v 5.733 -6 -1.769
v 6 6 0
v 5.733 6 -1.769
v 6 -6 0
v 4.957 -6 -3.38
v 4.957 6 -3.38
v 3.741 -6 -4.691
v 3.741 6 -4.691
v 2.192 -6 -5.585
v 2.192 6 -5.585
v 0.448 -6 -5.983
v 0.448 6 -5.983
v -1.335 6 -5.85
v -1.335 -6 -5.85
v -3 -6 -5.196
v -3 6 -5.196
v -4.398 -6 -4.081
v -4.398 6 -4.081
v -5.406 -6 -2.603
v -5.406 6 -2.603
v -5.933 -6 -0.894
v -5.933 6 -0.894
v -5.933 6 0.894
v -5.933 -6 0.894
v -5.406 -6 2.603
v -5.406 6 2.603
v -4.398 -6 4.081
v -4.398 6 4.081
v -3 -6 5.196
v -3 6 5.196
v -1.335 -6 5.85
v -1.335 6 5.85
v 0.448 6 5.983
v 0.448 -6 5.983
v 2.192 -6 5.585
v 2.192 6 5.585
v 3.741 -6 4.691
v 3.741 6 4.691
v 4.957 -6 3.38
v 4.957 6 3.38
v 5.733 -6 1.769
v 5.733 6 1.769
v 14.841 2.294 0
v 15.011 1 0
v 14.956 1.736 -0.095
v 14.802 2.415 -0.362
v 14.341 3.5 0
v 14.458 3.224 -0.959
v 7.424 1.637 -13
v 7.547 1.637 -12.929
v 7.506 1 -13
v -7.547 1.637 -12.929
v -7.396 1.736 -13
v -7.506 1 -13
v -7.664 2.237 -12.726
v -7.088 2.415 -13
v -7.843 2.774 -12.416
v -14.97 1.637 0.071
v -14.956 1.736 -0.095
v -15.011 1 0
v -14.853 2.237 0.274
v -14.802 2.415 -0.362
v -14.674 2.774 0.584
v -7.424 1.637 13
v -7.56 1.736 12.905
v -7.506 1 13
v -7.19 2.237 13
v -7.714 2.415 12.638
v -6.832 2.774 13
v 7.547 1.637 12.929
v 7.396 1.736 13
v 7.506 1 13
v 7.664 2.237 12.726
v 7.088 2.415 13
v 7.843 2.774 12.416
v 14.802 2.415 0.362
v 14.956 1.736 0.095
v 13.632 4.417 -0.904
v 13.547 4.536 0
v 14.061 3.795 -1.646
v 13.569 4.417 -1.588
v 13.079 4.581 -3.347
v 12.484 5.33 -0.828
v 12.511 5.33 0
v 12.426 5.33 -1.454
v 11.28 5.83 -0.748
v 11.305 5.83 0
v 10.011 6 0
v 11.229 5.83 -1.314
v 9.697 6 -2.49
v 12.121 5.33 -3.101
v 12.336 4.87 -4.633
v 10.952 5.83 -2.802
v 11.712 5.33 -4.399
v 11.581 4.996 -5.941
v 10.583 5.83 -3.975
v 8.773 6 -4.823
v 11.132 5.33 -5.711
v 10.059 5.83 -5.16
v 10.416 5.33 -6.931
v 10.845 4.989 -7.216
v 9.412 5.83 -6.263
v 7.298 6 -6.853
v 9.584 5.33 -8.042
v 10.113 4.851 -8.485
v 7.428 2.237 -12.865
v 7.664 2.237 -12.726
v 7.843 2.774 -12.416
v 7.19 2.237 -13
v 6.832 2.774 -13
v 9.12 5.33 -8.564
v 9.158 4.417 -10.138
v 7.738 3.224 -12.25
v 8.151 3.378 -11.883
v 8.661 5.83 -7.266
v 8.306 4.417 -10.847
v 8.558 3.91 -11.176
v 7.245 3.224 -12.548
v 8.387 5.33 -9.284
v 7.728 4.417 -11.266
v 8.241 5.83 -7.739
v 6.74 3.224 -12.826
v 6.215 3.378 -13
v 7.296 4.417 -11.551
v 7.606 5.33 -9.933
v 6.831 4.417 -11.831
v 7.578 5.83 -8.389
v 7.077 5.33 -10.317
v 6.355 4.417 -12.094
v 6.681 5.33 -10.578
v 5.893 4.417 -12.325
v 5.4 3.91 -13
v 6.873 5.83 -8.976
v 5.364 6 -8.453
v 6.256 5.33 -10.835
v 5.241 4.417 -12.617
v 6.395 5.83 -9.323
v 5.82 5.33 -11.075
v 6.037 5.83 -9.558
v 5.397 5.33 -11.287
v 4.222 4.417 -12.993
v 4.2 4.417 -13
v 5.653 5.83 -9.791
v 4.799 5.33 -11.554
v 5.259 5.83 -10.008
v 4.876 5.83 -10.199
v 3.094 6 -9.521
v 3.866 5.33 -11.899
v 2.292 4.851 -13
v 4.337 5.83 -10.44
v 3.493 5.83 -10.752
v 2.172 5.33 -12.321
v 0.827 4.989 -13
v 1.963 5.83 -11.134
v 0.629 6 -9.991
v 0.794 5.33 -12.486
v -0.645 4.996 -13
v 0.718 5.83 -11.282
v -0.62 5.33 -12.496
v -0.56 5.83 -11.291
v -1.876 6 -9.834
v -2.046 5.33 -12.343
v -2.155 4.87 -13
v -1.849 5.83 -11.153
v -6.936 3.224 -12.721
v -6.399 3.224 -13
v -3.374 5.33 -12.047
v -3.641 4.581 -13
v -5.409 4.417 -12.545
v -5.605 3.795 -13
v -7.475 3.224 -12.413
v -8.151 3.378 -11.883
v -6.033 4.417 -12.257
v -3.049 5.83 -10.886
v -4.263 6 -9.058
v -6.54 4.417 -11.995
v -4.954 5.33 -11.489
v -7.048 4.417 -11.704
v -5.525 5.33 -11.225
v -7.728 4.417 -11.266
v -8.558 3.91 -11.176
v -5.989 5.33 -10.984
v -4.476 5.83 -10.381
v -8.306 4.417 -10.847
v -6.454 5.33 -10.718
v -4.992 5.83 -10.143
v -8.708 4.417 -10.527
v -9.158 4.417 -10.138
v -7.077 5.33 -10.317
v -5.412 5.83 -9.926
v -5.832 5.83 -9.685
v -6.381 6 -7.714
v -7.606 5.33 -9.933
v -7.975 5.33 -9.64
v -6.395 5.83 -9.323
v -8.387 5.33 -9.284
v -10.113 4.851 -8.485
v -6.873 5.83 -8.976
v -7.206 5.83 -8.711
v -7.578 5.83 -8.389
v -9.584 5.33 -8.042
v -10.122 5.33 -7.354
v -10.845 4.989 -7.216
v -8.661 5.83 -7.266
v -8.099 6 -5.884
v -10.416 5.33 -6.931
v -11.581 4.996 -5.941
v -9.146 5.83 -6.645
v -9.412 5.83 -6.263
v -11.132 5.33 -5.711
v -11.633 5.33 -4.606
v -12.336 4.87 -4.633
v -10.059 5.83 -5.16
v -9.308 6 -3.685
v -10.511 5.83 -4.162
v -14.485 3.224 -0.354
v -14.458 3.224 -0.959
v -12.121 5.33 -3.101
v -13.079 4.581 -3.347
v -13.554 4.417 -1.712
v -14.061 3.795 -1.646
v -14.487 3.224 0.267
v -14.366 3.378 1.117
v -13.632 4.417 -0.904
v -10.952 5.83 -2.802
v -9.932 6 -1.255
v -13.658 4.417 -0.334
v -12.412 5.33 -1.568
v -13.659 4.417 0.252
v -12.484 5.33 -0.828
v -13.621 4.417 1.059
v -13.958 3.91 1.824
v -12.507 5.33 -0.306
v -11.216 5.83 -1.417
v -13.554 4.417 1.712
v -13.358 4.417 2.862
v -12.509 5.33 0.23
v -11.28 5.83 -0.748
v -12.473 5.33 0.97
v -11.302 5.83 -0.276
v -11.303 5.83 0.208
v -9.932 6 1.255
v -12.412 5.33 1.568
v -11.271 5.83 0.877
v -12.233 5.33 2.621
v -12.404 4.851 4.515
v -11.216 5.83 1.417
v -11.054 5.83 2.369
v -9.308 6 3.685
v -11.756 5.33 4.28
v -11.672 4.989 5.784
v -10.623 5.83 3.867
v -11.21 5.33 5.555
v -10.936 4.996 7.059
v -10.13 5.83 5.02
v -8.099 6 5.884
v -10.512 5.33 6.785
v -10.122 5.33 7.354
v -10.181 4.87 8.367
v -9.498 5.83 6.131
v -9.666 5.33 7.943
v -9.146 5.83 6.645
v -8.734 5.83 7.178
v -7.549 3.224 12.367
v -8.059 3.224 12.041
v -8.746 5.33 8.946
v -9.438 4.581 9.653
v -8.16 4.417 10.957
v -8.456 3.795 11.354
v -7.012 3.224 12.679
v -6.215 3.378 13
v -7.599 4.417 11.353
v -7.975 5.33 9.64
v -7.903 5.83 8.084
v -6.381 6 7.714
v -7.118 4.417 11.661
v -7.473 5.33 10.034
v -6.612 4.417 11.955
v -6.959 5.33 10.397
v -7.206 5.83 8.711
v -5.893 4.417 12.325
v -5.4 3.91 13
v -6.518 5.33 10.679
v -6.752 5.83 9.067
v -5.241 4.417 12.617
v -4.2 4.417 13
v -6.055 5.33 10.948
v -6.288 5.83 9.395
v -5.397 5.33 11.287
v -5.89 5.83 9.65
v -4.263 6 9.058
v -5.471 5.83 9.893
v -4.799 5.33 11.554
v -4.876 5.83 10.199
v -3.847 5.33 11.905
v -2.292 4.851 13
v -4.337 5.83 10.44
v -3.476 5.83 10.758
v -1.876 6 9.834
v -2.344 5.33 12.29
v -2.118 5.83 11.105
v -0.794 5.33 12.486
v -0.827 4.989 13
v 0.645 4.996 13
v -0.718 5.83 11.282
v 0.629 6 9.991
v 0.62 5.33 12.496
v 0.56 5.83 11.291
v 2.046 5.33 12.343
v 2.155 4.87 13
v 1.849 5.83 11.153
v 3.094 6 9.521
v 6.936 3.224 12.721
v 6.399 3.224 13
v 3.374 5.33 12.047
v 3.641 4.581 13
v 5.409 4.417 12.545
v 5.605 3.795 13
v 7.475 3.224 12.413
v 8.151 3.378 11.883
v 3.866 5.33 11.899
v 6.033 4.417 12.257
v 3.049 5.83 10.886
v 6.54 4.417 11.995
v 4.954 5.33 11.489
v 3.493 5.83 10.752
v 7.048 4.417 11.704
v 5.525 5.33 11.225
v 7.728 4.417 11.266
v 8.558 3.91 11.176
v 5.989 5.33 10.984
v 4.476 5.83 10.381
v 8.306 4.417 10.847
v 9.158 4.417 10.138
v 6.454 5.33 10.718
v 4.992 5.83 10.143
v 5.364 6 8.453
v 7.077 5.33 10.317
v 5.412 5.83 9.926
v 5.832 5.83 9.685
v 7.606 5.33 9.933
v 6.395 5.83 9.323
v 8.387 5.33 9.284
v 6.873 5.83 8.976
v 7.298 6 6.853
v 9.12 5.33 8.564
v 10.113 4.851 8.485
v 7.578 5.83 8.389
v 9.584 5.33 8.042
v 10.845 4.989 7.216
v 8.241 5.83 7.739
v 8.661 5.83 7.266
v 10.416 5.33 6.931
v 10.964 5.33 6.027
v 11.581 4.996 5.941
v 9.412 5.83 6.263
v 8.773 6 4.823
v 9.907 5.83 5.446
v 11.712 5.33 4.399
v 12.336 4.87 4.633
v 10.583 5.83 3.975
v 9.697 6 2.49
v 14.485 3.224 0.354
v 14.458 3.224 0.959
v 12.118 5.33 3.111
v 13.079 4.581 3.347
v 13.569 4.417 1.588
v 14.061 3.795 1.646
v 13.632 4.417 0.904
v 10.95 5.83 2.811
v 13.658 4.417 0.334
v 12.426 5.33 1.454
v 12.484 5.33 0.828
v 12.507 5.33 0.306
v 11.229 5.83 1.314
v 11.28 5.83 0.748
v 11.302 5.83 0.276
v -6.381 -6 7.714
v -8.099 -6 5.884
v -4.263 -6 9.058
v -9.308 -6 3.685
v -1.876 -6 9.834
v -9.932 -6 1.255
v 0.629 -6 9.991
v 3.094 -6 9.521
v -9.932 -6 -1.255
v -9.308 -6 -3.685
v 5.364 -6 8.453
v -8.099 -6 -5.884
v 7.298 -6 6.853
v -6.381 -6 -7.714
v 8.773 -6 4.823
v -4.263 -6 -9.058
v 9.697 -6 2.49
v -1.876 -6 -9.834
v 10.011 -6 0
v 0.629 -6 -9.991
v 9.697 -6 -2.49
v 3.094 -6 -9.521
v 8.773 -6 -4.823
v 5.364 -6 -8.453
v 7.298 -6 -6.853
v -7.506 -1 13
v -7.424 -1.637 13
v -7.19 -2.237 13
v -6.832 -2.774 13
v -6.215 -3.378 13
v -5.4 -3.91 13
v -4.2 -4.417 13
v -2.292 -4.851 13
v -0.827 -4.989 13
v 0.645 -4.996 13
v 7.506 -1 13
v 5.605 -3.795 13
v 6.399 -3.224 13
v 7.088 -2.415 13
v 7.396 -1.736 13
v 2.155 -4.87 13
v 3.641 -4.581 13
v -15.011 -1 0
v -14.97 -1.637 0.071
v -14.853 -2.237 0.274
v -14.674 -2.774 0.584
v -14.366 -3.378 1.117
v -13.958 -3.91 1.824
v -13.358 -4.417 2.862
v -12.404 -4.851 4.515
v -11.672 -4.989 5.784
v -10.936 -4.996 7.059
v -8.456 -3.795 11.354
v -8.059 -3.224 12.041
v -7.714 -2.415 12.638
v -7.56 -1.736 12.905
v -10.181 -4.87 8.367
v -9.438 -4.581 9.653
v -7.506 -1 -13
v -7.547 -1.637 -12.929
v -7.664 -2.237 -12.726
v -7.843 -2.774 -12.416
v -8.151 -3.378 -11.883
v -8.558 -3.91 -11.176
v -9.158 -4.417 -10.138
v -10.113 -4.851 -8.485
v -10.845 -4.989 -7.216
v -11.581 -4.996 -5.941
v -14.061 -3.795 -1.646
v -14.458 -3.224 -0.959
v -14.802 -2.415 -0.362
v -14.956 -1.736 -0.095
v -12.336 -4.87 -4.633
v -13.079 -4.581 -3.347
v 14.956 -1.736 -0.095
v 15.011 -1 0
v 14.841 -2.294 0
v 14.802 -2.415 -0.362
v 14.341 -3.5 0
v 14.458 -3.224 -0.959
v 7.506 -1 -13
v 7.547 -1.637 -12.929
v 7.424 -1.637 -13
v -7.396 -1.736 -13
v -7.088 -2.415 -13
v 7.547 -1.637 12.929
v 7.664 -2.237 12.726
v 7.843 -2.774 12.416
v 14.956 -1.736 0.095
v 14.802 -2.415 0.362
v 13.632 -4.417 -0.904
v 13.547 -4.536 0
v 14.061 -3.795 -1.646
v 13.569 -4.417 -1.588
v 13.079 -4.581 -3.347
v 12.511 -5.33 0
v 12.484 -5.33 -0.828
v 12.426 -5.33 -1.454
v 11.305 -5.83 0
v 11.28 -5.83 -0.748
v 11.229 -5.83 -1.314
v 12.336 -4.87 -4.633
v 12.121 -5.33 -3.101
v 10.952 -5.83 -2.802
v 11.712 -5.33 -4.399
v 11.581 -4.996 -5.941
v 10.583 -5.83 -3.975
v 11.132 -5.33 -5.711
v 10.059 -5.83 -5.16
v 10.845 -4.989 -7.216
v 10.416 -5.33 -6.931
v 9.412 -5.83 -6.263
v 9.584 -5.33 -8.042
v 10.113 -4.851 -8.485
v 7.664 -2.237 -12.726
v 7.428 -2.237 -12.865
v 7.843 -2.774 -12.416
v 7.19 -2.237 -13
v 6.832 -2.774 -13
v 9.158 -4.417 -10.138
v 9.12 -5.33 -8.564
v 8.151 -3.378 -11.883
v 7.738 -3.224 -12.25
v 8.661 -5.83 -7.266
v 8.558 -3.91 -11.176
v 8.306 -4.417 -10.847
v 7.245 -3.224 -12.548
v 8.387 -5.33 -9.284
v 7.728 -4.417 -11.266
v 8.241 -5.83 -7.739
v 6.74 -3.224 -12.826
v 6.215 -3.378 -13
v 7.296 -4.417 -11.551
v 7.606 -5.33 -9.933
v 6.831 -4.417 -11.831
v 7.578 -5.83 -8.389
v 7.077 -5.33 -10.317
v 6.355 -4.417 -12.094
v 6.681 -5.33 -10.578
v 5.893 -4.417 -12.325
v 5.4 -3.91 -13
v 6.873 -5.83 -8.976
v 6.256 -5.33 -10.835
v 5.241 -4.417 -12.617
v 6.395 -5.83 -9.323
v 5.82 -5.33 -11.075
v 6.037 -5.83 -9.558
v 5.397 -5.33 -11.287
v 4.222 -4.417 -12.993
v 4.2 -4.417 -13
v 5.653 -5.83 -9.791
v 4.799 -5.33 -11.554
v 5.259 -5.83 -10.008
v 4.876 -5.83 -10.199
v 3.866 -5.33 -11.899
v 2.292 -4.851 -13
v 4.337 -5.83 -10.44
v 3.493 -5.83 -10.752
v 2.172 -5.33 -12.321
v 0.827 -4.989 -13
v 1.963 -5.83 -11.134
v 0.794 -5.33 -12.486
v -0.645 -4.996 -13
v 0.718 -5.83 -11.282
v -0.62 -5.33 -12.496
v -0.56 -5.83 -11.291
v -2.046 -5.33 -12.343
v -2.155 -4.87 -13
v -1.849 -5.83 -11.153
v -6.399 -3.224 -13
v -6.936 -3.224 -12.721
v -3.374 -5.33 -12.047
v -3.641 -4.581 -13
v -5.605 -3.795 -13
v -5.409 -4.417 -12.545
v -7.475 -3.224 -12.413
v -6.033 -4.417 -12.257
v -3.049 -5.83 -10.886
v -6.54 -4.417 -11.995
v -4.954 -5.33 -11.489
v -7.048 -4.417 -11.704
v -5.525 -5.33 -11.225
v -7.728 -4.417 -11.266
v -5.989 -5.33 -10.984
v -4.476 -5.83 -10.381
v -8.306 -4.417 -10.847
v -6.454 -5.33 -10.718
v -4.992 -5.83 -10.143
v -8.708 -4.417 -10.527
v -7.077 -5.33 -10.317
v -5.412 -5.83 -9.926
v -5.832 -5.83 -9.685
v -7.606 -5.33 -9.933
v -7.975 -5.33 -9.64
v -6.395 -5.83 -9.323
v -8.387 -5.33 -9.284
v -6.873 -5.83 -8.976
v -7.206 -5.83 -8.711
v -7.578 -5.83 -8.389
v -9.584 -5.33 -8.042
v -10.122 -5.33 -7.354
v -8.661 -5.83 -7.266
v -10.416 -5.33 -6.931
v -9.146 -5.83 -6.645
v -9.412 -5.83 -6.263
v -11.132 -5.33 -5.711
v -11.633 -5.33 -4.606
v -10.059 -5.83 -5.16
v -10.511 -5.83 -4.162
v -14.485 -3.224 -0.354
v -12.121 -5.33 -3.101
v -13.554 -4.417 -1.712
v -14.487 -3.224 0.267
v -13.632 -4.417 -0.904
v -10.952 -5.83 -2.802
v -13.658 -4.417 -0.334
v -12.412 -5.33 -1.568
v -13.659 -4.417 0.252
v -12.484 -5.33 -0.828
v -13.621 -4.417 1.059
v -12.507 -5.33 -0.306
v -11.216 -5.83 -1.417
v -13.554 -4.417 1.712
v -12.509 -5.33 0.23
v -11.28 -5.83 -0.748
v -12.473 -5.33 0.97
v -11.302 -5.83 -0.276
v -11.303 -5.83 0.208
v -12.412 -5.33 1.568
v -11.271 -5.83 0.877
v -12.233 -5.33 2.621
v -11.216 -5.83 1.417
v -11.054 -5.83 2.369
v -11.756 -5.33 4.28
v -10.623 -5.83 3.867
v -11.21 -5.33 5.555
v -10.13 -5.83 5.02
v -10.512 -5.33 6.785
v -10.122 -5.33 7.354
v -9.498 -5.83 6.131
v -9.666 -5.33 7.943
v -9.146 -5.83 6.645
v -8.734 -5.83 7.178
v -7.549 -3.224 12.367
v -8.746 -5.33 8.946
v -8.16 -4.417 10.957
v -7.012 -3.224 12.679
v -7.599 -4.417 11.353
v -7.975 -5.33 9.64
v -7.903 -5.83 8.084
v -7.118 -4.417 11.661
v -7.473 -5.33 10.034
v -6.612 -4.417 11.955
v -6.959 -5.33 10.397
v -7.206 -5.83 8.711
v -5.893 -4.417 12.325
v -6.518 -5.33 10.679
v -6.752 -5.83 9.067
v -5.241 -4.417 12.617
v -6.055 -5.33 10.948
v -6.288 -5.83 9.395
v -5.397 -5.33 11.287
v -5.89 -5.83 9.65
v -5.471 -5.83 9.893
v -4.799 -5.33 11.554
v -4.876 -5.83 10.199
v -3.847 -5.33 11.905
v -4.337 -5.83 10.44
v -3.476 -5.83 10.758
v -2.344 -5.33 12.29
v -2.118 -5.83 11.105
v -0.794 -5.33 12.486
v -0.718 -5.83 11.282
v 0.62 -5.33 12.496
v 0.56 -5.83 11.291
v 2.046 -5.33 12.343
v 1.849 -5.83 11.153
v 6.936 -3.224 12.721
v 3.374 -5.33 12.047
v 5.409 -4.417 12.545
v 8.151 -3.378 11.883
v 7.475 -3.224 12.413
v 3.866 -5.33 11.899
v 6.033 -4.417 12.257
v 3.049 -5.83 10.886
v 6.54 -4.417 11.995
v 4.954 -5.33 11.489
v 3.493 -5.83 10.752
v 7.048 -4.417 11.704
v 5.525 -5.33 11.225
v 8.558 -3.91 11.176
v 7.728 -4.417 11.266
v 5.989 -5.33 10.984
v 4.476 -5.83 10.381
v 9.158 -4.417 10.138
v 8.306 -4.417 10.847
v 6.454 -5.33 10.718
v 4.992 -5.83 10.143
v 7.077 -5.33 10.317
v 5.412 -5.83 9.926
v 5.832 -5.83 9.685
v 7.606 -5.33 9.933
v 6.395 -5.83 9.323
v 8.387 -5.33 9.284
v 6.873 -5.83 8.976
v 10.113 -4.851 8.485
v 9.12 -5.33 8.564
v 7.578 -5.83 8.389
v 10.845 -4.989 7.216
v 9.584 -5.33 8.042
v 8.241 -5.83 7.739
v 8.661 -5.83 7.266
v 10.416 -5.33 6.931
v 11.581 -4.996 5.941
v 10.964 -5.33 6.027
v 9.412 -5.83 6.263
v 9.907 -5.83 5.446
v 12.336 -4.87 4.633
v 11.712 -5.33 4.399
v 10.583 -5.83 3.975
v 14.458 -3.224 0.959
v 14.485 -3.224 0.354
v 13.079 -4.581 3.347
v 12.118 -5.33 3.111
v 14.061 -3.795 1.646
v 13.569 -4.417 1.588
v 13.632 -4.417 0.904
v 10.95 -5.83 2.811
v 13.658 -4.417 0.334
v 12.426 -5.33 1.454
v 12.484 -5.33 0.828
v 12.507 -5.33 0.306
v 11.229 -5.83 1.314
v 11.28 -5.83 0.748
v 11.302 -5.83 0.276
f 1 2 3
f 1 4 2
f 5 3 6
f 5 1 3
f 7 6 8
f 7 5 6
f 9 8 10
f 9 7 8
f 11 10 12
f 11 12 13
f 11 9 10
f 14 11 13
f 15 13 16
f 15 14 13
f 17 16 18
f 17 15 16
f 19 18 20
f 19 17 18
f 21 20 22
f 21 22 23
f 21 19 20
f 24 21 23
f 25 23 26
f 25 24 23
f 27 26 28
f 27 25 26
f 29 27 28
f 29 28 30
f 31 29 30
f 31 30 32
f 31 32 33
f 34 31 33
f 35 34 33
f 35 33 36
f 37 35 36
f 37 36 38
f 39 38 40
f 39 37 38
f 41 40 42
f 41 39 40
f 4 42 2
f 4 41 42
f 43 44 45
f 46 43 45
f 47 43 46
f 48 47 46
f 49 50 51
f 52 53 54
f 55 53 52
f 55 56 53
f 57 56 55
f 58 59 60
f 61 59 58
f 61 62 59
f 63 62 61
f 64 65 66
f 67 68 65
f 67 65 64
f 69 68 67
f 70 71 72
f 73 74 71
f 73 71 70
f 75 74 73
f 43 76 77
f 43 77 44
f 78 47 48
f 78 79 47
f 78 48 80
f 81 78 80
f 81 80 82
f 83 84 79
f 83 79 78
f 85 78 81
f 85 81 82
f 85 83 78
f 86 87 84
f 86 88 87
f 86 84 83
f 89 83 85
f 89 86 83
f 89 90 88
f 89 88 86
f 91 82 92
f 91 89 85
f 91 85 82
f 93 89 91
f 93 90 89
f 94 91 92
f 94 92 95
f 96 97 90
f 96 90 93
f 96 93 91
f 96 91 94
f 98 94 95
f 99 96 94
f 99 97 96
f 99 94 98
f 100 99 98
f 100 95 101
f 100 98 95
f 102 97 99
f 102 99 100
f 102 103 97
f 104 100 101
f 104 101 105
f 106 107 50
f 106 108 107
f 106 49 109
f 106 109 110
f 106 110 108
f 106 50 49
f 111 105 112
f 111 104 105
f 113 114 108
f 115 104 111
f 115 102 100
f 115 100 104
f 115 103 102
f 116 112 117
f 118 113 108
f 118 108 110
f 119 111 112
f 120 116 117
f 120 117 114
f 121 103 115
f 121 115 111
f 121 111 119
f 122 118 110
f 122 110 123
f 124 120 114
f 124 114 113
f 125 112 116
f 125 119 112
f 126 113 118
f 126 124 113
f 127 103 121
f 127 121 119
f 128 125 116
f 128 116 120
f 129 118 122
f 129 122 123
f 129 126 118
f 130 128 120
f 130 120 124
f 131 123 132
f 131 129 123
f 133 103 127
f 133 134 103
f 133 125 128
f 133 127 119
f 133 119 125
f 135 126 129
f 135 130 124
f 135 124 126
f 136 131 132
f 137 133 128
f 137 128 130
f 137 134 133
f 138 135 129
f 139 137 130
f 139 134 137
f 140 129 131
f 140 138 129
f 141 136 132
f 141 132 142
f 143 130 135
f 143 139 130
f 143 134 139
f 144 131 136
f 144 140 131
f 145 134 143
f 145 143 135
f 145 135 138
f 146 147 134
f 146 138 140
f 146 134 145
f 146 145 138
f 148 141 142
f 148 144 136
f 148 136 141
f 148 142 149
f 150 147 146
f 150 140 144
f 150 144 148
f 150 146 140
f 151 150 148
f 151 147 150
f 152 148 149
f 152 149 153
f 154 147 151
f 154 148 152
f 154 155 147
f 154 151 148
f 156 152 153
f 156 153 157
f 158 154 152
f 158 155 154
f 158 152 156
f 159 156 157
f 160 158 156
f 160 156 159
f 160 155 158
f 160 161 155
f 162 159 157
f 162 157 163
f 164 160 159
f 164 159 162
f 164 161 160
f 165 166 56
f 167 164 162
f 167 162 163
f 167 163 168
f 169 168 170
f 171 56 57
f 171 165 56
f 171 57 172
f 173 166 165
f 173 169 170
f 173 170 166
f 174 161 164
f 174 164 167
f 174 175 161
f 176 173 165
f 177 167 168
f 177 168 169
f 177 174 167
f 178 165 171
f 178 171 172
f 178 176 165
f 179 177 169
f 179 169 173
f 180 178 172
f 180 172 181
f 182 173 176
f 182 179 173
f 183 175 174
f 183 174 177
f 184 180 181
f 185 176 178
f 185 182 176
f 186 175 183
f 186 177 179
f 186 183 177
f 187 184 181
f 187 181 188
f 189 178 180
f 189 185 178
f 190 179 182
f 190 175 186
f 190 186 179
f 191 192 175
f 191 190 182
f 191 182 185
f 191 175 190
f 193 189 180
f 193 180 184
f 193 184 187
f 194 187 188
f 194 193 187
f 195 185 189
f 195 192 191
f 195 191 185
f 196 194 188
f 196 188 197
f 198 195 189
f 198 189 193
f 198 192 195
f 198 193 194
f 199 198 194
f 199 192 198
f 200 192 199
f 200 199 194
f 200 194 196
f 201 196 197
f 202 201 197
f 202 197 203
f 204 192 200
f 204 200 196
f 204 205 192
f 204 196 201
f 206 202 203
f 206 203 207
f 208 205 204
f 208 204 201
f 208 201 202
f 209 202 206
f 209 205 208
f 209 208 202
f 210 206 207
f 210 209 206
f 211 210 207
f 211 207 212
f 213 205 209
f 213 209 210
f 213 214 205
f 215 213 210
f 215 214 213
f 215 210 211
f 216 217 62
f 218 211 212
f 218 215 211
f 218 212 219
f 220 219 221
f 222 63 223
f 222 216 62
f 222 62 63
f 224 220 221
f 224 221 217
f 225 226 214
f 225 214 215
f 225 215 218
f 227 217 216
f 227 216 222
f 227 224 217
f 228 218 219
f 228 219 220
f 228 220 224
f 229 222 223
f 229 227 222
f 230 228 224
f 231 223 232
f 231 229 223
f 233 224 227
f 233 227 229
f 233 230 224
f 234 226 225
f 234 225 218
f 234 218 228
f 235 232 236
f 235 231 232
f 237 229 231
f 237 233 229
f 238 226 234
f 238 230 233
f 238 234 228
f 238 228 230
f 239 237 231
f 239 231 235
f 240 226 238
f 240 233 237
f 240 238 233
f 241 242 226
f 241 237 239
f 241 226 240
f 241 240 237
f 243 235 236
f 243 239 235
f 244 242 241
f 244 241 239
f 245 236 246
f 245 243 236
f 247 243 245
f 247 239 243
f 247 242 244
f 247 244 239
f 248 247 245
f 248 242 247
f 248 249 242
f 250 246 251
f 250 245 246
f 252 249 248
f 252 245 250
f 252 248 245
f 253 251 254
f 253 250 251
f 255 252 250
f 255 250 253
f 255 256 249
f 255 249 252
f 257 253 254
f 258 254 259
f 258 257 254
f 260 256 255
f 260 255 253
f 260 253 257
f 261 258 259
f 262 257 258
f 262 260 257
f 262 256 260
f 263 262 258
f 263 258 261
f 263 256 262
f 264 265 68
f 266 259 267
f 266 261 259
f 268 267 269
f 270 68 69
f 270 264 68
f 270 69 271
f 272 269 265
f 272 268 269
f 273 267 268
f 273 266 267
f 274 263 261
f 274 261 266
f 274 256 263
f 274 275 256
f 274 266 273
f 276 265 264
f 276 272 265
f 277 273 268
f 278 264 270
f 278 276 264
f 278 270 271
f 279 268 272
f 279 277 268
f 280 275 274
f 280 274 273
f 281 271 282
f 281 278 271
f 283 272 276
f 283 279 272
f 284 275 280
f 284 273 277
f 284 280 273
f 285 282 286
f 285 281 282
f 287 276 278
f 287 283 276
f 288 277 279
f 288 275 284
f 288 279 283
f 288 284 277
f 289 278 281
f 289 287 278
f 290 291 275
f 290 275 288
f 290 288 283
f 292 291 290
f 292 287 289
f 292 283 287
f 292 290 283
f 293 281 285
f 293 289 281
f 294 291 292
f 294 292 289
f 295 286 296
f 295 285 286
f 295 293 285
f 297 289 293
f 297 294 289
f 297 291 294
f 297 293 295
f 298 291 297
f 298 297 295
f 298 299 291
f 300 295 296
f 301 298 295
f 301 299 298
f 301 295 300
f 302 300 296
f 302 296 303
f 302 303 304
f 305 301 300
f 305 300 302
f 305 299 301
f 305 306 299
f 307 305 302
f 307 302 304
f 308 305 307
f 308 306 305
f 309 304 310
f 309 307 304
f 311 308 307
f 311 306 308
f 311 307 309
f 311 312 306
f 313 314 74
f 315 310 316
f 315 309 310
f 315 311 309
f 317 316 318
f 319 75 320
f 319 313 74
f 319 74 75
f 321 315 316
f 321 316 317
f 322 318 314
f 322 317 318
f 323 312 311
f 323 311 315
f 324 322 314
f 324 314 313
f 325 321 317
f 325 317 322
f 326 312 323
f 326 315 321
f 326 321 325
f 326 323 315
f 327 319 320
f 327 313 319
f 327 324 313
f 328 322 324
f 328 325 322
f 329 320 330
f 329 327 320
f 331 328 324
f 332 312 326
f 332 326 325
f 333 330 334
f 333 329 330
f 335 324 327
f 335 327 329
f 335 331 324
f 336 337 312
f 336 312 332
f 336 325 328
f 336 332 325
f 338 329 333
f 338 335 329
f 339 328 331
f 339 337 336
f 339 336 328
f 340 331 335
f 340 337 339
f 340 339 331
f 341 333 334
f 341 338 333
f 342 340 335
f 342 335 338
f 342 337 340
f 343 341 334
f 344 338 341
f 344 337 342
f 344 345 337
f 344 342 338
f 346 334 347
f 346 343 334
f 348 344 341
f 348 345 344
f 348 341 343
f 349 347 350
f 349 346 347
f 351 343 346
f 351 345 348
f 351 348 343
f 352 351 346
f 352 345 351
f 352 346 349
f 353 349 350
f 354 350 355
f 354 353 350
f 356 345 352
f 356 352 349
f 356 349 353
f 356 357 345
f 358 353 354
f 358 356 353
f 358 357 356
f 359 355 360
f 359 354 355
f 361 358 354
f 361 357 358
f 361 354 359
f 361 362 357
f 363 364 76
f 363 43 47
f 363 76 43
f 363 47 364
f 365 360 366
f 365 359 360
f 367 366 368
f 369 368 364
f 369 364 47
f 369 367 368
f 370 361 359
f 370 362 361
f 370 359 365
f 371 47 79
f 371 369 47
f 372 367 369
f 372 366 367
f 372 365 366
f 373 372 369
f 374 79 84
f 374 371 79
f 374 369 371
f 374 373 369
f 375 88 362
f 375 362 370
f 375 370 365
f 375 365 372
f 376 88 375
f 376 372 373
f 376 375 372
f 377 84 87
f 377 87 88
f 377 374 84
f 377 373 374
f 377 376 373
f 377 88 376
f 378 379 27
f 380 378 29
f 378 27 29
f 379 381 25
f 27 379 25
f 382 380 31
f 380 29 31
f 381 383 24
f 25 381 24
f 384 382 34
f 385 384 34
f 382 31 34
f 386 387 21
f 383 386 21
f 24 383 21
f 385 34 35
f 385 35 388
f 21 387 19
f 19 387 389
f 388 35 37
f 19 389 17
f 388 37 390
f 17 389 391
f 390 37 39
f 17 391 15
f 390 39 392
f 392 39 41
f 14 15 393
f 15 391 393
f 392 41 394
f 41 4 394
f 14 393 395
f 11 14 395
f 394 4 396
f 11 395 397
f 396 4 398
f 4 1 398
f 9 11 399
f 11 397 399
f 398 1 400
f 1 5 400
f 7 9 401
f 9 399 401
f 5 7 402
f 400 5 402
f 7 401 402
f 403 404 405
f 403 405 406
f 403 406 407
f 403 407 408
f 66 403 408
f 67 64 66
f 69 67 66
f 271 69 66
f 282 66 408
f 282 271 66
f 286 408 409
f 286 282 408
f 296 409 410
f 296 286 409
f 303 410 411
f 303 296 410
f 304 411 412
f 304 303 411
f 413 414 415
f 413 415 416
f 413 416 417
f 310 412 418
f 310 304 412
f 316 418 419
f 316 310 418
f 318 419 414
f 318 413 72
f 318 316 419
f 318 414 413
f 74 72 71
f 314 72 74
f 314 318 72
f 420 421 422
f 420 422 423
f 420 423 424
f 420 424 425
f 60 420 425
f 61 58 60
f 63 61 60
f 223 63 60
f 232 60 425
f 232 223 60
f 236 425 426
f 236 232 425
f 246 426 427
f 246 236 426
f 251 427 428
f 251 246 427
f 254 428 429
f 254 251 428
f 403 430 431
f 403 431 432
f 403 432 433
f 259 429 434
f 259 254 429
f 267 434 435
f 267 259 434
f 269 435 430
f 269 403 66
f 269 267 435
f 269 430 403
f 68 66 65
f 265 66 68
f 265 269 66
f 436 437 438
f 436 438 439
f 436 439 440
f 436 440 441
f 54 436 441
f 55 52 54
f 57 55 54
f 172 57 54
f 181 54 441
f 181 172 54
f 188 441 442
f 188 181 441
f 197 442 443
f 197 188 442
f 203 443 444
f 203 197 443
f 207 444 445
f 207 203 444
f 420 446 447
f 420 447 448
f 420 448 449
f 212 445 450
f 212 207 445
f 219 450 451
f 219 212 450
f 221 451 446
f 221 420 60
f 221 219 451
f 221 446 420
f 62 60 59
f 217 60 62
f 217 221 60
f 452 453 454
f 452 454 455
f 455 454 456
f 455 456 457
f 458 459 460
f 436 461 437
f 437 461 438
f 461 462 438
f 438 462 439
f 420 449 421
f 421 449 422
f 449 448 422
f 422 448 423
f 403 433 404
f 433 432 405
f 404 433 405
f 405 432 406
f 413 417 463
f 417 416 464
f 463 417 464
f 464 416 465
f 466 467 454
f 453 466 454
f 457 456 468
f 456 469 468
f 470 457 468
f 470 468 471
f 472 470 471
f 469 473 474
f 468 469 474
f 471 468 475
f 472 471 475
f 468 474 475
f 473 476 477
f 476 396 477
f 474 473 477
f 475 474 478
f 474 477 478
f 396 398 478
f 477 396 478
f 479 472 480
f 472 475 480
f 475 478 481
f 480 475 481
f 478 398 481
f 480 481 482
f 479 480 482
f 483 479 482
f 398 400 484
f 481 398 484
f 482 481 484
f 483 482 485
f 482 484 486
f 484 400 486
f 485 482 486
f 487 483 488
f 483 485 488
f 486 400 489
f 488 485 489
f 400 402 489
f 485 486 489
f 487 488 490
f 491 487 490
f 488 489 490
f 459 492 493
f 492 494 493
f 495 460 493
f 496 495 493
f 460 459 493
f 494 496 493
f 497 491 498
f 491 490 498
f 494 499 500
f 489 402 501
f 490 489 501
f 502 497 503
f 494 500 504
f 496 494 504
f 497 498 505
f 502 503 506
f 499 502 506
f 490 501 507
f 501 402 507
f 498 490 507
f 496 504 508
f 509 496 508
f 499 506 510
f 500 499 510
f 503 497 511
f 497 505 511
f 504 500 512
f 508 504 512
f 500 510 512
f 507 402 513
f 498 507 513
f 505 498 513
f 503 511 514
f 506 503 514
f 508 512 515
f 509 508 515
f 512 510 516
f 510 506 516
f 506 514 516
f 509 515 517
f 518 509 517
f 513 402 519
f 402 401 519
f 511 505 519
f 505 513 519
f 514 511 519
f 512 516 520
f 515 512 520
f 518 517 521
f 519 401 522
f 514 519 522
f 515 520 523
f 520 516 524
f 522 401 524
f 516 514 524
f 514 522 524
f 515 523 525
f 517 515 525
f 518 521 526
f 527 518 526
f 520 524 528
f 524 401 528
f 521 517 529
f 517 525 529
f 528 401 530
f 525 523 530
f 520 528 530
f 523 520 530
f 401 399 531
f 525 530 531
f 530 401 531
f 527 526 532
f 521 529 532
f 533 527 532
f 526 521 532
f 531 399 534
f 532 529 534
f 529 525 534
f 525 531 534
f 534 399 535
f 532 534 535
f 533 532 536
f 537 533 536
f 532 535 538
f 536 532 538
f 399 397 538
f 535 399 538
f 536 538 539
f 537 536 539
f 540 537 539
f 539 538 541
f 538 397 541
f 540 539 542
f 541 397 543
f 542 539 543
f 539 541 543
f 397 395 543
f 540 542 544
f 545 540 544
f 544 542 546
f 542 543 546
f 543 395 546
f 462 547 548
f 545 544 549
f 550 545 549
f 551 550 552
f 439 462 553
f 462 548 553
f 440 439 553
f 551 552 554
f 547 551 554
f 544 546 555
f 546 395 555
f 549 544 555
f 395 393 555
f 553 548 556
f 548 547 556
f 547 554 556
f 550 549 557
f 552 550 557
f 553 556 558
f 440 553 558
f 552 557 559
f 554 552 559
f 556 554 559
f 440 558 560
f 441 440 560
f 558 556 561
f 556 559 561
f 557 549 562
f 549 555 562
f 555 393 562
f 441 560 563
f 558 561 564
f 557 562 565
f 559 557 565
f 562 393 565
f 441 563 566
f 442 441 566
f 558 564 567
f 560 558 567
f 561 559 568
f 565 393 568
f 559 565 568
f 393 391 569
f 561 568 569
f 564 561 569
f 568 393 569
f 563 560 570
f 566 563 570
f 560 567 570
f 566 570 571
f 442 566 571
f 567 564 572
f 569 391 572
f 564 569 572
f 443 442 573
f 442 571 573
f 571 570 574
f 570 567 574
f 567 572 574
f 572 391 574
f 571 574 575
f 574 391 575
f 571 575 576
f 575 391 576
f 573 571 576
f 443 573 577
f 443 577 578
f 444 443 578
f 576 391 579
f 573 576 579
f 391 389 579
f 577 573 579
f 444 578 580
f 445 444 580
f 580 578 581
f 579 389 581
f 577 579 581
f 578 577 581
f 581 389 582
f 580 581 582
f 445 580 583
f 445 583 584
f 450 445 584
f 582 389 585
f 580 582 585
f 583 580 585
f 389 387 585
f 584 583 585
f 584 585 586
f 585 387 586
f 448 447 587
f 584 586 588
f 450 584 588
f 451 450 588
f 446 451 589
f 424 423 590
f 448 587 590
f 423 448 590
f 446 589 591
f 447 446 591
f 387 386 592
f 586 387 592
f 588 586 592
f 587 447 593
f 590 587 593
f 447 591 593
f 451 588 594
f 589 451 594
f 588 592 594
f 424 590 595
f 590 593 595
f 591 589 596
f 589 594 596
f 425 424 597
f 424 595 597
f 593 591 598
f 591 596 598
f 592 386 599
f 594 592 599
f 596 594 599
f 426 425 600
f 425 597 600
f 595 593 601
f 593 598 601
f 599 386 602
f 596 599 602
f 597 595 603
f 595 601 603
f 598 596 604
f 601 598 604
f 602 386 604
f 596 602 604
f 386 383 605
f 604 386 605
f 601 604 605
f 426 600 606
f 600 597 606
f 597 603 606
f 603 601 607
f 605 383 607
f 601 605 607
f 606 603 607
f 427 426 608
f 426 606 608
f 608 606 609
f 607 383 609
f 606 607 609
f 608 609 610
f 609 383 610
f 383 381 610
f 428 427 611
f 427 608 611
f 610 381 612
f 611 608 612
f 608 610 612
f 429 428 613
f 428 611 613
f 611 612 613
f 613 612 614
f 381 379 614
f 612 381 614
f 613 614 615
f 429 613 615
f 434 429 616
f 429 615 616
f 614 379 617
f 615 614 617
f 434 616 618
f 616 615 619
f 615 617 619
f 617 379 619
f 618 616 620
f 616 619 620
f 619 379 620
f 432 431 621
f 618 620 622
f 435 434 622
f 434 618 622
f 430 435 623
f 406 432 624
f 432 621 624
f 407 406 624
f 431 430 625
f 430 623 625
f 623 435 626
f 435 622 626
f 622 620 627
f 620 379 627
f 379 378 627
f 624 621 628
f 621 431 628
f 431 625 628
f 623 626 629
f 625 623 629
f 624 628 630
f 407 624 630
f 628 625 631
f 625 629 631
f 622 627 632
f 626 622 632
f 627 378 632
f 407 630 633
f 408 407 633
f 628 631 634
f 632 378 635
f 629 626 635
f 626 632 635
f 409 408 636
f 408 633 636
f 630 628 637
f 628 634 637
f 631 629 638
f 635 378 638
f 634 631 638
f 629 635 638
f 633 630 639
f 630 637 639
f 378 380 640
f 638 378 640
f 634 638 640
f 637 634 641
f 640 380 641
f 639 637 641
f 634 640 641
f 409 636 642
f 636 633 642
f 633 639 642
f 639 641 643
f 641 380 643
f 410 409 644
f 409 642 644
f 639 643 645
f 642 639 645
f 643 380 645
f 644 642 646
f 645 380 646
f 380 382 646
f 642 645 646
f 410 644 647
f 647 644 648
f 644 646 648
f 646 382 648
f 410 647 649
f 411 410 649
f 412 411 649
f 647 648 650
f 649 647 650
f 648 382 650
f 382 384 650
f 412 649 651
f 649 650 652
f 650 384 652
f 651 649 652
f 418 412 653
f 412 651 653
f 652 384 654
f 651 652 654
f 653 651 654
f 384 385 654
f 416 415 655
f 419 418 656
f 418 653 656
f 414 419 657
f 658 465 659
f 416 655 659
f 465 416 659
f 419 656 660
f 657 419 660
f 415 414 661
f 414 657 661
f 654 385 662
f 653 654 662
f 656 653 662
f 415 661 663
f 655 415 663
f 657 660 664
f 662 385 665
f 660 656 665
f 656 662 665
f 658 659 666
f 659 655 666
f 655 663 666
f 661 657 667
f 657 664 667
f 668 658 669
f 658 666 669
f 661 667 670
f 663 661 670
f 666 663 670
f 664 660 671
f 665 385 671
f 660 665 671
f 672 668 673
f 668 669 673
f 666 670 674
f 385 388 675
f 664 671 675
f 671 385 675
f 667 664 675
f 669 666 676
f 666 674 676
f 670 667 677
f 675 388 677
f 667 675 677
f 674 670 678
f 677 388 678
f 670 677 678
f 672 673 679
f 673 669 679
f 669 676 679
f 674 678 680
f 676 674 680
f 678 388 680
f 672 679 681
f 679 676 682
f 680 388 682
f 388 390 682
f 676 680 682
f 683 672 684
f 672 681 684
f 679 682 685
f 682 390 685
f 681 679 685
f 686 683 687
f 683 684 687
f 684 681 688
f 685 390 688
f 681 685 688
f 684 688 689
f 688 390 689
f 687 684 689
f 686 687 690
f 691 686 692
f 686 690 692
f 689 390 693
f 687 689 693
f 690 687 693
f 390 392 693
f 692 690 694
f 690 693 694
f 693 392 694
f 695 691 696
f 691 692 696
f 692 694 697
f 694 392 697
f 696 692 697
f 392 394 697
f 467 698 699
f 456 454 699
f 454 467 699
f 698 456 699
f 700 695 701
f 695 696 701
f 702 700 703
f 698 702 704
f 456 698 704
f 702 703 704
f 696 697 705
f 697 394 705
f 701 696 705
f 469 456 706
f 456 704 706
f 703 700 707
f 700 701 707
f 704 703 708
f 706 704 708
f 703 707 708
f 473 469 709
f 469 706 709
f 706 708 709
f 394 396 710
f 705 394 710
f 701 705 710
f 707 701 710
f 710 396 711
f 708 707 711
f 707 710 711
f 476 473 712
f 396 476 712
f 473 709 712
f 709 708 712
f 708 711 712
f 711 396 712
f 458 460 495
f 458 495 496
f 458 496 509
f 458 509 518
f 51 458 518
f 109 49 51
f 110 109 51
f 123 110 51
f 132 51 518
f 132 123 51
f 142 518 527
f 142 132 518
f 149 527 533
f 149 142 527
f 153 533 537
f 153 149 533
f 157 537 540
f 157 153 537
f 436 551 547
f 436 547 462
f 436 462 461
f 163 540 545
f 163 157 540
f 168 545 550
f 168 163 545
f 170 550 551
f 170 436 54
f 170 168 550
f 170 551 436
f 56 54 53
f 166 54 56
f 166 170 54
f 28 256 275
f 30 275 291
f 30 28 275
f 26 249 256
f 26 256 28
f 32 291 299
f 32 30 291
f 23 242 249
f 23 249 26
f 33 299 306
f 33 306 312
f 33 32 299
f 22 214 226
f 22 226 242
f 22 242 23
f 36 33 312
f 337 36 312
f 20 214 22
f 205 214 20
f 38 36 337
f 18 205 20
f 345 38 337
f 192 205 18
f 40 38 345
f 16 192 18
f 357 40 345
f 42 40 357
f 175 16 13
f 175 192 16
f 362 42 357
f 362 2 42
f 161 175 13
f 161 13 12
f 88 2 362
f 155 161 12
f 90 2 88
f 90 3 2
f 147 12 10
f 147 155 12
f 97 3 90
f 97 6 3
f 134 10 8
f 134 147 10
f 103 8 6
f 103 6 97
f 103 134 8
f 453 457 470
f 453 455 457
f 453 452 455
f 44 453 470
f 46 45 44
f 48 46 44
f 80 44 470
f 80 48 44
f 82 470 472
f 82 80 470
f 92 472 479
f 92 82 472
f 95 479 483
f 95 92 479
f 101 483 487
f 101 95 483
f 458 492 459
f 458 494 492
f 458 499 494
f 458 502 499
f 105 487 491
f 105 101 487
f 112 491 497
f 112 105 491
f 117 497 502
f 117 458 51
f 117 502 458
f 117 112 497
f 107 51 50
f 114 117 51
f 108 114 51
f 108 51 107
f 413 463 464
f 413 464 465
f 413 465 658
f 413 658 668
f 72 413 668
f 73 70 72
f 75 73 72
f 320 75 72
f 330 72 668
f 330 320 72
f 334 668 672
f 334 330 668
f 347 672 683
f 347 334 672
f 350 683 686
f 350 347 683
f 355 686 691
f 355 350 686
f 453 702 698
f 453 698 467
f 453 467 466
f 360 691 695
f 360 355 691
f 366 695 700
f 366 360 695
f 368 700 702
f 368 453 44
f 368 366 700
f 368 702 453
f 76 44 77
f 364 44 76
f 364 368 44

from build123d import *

# Parameters (mm, degrees)
SKETCH1_R           = 6
BOSS_EXTRUDE1_DEPTH = 6


with BuildPart() as part:
    # Sketch1 → Boss-Extrude1 (new body, symmetric)
    with BuildSketch(Plane(origin=(0, 0, 0), x_dir=(1, 0, 0), z_dir=(0, 1, 0))):
        Polygon((15.011106999, 0), (7.505553499, 13), (-7.505553499, 13), (-15.011106999, 0), (-7.505553499, -13), (7.505553499, -13), align=None)
        Circle(SKETCH1_R, mode=Mode.SUBTRACT)
    extrude(amount=BOSS_EXTRUDE1_DEPTH, both=True)

    # Sketch3 → Cut-Revolve1 (revolve, cut)
    with BuildSketch(Plane.XY):
        with BuildLine():
            Line((10.011106999, 6), (15.011106999, 6))
            Line((15.011106999, 6), (15.011106999, 1))
            ThreePointArc((15.011106999, 1), (13.546640905, 4.535533906), (10.011106999, 6))
        make_face()
    cut_revolve1 = revolve(axis=Axis((0, 1.164773658, 0), (0, 1, 0)), mode=Mode.SUBTRACT)

    # Mirror1: Cut-Revolve1 across plane
    add(cut_revolve1.mirror(Plane.ZX), mode=Mode.SUBTRACT)


solid = part.part
